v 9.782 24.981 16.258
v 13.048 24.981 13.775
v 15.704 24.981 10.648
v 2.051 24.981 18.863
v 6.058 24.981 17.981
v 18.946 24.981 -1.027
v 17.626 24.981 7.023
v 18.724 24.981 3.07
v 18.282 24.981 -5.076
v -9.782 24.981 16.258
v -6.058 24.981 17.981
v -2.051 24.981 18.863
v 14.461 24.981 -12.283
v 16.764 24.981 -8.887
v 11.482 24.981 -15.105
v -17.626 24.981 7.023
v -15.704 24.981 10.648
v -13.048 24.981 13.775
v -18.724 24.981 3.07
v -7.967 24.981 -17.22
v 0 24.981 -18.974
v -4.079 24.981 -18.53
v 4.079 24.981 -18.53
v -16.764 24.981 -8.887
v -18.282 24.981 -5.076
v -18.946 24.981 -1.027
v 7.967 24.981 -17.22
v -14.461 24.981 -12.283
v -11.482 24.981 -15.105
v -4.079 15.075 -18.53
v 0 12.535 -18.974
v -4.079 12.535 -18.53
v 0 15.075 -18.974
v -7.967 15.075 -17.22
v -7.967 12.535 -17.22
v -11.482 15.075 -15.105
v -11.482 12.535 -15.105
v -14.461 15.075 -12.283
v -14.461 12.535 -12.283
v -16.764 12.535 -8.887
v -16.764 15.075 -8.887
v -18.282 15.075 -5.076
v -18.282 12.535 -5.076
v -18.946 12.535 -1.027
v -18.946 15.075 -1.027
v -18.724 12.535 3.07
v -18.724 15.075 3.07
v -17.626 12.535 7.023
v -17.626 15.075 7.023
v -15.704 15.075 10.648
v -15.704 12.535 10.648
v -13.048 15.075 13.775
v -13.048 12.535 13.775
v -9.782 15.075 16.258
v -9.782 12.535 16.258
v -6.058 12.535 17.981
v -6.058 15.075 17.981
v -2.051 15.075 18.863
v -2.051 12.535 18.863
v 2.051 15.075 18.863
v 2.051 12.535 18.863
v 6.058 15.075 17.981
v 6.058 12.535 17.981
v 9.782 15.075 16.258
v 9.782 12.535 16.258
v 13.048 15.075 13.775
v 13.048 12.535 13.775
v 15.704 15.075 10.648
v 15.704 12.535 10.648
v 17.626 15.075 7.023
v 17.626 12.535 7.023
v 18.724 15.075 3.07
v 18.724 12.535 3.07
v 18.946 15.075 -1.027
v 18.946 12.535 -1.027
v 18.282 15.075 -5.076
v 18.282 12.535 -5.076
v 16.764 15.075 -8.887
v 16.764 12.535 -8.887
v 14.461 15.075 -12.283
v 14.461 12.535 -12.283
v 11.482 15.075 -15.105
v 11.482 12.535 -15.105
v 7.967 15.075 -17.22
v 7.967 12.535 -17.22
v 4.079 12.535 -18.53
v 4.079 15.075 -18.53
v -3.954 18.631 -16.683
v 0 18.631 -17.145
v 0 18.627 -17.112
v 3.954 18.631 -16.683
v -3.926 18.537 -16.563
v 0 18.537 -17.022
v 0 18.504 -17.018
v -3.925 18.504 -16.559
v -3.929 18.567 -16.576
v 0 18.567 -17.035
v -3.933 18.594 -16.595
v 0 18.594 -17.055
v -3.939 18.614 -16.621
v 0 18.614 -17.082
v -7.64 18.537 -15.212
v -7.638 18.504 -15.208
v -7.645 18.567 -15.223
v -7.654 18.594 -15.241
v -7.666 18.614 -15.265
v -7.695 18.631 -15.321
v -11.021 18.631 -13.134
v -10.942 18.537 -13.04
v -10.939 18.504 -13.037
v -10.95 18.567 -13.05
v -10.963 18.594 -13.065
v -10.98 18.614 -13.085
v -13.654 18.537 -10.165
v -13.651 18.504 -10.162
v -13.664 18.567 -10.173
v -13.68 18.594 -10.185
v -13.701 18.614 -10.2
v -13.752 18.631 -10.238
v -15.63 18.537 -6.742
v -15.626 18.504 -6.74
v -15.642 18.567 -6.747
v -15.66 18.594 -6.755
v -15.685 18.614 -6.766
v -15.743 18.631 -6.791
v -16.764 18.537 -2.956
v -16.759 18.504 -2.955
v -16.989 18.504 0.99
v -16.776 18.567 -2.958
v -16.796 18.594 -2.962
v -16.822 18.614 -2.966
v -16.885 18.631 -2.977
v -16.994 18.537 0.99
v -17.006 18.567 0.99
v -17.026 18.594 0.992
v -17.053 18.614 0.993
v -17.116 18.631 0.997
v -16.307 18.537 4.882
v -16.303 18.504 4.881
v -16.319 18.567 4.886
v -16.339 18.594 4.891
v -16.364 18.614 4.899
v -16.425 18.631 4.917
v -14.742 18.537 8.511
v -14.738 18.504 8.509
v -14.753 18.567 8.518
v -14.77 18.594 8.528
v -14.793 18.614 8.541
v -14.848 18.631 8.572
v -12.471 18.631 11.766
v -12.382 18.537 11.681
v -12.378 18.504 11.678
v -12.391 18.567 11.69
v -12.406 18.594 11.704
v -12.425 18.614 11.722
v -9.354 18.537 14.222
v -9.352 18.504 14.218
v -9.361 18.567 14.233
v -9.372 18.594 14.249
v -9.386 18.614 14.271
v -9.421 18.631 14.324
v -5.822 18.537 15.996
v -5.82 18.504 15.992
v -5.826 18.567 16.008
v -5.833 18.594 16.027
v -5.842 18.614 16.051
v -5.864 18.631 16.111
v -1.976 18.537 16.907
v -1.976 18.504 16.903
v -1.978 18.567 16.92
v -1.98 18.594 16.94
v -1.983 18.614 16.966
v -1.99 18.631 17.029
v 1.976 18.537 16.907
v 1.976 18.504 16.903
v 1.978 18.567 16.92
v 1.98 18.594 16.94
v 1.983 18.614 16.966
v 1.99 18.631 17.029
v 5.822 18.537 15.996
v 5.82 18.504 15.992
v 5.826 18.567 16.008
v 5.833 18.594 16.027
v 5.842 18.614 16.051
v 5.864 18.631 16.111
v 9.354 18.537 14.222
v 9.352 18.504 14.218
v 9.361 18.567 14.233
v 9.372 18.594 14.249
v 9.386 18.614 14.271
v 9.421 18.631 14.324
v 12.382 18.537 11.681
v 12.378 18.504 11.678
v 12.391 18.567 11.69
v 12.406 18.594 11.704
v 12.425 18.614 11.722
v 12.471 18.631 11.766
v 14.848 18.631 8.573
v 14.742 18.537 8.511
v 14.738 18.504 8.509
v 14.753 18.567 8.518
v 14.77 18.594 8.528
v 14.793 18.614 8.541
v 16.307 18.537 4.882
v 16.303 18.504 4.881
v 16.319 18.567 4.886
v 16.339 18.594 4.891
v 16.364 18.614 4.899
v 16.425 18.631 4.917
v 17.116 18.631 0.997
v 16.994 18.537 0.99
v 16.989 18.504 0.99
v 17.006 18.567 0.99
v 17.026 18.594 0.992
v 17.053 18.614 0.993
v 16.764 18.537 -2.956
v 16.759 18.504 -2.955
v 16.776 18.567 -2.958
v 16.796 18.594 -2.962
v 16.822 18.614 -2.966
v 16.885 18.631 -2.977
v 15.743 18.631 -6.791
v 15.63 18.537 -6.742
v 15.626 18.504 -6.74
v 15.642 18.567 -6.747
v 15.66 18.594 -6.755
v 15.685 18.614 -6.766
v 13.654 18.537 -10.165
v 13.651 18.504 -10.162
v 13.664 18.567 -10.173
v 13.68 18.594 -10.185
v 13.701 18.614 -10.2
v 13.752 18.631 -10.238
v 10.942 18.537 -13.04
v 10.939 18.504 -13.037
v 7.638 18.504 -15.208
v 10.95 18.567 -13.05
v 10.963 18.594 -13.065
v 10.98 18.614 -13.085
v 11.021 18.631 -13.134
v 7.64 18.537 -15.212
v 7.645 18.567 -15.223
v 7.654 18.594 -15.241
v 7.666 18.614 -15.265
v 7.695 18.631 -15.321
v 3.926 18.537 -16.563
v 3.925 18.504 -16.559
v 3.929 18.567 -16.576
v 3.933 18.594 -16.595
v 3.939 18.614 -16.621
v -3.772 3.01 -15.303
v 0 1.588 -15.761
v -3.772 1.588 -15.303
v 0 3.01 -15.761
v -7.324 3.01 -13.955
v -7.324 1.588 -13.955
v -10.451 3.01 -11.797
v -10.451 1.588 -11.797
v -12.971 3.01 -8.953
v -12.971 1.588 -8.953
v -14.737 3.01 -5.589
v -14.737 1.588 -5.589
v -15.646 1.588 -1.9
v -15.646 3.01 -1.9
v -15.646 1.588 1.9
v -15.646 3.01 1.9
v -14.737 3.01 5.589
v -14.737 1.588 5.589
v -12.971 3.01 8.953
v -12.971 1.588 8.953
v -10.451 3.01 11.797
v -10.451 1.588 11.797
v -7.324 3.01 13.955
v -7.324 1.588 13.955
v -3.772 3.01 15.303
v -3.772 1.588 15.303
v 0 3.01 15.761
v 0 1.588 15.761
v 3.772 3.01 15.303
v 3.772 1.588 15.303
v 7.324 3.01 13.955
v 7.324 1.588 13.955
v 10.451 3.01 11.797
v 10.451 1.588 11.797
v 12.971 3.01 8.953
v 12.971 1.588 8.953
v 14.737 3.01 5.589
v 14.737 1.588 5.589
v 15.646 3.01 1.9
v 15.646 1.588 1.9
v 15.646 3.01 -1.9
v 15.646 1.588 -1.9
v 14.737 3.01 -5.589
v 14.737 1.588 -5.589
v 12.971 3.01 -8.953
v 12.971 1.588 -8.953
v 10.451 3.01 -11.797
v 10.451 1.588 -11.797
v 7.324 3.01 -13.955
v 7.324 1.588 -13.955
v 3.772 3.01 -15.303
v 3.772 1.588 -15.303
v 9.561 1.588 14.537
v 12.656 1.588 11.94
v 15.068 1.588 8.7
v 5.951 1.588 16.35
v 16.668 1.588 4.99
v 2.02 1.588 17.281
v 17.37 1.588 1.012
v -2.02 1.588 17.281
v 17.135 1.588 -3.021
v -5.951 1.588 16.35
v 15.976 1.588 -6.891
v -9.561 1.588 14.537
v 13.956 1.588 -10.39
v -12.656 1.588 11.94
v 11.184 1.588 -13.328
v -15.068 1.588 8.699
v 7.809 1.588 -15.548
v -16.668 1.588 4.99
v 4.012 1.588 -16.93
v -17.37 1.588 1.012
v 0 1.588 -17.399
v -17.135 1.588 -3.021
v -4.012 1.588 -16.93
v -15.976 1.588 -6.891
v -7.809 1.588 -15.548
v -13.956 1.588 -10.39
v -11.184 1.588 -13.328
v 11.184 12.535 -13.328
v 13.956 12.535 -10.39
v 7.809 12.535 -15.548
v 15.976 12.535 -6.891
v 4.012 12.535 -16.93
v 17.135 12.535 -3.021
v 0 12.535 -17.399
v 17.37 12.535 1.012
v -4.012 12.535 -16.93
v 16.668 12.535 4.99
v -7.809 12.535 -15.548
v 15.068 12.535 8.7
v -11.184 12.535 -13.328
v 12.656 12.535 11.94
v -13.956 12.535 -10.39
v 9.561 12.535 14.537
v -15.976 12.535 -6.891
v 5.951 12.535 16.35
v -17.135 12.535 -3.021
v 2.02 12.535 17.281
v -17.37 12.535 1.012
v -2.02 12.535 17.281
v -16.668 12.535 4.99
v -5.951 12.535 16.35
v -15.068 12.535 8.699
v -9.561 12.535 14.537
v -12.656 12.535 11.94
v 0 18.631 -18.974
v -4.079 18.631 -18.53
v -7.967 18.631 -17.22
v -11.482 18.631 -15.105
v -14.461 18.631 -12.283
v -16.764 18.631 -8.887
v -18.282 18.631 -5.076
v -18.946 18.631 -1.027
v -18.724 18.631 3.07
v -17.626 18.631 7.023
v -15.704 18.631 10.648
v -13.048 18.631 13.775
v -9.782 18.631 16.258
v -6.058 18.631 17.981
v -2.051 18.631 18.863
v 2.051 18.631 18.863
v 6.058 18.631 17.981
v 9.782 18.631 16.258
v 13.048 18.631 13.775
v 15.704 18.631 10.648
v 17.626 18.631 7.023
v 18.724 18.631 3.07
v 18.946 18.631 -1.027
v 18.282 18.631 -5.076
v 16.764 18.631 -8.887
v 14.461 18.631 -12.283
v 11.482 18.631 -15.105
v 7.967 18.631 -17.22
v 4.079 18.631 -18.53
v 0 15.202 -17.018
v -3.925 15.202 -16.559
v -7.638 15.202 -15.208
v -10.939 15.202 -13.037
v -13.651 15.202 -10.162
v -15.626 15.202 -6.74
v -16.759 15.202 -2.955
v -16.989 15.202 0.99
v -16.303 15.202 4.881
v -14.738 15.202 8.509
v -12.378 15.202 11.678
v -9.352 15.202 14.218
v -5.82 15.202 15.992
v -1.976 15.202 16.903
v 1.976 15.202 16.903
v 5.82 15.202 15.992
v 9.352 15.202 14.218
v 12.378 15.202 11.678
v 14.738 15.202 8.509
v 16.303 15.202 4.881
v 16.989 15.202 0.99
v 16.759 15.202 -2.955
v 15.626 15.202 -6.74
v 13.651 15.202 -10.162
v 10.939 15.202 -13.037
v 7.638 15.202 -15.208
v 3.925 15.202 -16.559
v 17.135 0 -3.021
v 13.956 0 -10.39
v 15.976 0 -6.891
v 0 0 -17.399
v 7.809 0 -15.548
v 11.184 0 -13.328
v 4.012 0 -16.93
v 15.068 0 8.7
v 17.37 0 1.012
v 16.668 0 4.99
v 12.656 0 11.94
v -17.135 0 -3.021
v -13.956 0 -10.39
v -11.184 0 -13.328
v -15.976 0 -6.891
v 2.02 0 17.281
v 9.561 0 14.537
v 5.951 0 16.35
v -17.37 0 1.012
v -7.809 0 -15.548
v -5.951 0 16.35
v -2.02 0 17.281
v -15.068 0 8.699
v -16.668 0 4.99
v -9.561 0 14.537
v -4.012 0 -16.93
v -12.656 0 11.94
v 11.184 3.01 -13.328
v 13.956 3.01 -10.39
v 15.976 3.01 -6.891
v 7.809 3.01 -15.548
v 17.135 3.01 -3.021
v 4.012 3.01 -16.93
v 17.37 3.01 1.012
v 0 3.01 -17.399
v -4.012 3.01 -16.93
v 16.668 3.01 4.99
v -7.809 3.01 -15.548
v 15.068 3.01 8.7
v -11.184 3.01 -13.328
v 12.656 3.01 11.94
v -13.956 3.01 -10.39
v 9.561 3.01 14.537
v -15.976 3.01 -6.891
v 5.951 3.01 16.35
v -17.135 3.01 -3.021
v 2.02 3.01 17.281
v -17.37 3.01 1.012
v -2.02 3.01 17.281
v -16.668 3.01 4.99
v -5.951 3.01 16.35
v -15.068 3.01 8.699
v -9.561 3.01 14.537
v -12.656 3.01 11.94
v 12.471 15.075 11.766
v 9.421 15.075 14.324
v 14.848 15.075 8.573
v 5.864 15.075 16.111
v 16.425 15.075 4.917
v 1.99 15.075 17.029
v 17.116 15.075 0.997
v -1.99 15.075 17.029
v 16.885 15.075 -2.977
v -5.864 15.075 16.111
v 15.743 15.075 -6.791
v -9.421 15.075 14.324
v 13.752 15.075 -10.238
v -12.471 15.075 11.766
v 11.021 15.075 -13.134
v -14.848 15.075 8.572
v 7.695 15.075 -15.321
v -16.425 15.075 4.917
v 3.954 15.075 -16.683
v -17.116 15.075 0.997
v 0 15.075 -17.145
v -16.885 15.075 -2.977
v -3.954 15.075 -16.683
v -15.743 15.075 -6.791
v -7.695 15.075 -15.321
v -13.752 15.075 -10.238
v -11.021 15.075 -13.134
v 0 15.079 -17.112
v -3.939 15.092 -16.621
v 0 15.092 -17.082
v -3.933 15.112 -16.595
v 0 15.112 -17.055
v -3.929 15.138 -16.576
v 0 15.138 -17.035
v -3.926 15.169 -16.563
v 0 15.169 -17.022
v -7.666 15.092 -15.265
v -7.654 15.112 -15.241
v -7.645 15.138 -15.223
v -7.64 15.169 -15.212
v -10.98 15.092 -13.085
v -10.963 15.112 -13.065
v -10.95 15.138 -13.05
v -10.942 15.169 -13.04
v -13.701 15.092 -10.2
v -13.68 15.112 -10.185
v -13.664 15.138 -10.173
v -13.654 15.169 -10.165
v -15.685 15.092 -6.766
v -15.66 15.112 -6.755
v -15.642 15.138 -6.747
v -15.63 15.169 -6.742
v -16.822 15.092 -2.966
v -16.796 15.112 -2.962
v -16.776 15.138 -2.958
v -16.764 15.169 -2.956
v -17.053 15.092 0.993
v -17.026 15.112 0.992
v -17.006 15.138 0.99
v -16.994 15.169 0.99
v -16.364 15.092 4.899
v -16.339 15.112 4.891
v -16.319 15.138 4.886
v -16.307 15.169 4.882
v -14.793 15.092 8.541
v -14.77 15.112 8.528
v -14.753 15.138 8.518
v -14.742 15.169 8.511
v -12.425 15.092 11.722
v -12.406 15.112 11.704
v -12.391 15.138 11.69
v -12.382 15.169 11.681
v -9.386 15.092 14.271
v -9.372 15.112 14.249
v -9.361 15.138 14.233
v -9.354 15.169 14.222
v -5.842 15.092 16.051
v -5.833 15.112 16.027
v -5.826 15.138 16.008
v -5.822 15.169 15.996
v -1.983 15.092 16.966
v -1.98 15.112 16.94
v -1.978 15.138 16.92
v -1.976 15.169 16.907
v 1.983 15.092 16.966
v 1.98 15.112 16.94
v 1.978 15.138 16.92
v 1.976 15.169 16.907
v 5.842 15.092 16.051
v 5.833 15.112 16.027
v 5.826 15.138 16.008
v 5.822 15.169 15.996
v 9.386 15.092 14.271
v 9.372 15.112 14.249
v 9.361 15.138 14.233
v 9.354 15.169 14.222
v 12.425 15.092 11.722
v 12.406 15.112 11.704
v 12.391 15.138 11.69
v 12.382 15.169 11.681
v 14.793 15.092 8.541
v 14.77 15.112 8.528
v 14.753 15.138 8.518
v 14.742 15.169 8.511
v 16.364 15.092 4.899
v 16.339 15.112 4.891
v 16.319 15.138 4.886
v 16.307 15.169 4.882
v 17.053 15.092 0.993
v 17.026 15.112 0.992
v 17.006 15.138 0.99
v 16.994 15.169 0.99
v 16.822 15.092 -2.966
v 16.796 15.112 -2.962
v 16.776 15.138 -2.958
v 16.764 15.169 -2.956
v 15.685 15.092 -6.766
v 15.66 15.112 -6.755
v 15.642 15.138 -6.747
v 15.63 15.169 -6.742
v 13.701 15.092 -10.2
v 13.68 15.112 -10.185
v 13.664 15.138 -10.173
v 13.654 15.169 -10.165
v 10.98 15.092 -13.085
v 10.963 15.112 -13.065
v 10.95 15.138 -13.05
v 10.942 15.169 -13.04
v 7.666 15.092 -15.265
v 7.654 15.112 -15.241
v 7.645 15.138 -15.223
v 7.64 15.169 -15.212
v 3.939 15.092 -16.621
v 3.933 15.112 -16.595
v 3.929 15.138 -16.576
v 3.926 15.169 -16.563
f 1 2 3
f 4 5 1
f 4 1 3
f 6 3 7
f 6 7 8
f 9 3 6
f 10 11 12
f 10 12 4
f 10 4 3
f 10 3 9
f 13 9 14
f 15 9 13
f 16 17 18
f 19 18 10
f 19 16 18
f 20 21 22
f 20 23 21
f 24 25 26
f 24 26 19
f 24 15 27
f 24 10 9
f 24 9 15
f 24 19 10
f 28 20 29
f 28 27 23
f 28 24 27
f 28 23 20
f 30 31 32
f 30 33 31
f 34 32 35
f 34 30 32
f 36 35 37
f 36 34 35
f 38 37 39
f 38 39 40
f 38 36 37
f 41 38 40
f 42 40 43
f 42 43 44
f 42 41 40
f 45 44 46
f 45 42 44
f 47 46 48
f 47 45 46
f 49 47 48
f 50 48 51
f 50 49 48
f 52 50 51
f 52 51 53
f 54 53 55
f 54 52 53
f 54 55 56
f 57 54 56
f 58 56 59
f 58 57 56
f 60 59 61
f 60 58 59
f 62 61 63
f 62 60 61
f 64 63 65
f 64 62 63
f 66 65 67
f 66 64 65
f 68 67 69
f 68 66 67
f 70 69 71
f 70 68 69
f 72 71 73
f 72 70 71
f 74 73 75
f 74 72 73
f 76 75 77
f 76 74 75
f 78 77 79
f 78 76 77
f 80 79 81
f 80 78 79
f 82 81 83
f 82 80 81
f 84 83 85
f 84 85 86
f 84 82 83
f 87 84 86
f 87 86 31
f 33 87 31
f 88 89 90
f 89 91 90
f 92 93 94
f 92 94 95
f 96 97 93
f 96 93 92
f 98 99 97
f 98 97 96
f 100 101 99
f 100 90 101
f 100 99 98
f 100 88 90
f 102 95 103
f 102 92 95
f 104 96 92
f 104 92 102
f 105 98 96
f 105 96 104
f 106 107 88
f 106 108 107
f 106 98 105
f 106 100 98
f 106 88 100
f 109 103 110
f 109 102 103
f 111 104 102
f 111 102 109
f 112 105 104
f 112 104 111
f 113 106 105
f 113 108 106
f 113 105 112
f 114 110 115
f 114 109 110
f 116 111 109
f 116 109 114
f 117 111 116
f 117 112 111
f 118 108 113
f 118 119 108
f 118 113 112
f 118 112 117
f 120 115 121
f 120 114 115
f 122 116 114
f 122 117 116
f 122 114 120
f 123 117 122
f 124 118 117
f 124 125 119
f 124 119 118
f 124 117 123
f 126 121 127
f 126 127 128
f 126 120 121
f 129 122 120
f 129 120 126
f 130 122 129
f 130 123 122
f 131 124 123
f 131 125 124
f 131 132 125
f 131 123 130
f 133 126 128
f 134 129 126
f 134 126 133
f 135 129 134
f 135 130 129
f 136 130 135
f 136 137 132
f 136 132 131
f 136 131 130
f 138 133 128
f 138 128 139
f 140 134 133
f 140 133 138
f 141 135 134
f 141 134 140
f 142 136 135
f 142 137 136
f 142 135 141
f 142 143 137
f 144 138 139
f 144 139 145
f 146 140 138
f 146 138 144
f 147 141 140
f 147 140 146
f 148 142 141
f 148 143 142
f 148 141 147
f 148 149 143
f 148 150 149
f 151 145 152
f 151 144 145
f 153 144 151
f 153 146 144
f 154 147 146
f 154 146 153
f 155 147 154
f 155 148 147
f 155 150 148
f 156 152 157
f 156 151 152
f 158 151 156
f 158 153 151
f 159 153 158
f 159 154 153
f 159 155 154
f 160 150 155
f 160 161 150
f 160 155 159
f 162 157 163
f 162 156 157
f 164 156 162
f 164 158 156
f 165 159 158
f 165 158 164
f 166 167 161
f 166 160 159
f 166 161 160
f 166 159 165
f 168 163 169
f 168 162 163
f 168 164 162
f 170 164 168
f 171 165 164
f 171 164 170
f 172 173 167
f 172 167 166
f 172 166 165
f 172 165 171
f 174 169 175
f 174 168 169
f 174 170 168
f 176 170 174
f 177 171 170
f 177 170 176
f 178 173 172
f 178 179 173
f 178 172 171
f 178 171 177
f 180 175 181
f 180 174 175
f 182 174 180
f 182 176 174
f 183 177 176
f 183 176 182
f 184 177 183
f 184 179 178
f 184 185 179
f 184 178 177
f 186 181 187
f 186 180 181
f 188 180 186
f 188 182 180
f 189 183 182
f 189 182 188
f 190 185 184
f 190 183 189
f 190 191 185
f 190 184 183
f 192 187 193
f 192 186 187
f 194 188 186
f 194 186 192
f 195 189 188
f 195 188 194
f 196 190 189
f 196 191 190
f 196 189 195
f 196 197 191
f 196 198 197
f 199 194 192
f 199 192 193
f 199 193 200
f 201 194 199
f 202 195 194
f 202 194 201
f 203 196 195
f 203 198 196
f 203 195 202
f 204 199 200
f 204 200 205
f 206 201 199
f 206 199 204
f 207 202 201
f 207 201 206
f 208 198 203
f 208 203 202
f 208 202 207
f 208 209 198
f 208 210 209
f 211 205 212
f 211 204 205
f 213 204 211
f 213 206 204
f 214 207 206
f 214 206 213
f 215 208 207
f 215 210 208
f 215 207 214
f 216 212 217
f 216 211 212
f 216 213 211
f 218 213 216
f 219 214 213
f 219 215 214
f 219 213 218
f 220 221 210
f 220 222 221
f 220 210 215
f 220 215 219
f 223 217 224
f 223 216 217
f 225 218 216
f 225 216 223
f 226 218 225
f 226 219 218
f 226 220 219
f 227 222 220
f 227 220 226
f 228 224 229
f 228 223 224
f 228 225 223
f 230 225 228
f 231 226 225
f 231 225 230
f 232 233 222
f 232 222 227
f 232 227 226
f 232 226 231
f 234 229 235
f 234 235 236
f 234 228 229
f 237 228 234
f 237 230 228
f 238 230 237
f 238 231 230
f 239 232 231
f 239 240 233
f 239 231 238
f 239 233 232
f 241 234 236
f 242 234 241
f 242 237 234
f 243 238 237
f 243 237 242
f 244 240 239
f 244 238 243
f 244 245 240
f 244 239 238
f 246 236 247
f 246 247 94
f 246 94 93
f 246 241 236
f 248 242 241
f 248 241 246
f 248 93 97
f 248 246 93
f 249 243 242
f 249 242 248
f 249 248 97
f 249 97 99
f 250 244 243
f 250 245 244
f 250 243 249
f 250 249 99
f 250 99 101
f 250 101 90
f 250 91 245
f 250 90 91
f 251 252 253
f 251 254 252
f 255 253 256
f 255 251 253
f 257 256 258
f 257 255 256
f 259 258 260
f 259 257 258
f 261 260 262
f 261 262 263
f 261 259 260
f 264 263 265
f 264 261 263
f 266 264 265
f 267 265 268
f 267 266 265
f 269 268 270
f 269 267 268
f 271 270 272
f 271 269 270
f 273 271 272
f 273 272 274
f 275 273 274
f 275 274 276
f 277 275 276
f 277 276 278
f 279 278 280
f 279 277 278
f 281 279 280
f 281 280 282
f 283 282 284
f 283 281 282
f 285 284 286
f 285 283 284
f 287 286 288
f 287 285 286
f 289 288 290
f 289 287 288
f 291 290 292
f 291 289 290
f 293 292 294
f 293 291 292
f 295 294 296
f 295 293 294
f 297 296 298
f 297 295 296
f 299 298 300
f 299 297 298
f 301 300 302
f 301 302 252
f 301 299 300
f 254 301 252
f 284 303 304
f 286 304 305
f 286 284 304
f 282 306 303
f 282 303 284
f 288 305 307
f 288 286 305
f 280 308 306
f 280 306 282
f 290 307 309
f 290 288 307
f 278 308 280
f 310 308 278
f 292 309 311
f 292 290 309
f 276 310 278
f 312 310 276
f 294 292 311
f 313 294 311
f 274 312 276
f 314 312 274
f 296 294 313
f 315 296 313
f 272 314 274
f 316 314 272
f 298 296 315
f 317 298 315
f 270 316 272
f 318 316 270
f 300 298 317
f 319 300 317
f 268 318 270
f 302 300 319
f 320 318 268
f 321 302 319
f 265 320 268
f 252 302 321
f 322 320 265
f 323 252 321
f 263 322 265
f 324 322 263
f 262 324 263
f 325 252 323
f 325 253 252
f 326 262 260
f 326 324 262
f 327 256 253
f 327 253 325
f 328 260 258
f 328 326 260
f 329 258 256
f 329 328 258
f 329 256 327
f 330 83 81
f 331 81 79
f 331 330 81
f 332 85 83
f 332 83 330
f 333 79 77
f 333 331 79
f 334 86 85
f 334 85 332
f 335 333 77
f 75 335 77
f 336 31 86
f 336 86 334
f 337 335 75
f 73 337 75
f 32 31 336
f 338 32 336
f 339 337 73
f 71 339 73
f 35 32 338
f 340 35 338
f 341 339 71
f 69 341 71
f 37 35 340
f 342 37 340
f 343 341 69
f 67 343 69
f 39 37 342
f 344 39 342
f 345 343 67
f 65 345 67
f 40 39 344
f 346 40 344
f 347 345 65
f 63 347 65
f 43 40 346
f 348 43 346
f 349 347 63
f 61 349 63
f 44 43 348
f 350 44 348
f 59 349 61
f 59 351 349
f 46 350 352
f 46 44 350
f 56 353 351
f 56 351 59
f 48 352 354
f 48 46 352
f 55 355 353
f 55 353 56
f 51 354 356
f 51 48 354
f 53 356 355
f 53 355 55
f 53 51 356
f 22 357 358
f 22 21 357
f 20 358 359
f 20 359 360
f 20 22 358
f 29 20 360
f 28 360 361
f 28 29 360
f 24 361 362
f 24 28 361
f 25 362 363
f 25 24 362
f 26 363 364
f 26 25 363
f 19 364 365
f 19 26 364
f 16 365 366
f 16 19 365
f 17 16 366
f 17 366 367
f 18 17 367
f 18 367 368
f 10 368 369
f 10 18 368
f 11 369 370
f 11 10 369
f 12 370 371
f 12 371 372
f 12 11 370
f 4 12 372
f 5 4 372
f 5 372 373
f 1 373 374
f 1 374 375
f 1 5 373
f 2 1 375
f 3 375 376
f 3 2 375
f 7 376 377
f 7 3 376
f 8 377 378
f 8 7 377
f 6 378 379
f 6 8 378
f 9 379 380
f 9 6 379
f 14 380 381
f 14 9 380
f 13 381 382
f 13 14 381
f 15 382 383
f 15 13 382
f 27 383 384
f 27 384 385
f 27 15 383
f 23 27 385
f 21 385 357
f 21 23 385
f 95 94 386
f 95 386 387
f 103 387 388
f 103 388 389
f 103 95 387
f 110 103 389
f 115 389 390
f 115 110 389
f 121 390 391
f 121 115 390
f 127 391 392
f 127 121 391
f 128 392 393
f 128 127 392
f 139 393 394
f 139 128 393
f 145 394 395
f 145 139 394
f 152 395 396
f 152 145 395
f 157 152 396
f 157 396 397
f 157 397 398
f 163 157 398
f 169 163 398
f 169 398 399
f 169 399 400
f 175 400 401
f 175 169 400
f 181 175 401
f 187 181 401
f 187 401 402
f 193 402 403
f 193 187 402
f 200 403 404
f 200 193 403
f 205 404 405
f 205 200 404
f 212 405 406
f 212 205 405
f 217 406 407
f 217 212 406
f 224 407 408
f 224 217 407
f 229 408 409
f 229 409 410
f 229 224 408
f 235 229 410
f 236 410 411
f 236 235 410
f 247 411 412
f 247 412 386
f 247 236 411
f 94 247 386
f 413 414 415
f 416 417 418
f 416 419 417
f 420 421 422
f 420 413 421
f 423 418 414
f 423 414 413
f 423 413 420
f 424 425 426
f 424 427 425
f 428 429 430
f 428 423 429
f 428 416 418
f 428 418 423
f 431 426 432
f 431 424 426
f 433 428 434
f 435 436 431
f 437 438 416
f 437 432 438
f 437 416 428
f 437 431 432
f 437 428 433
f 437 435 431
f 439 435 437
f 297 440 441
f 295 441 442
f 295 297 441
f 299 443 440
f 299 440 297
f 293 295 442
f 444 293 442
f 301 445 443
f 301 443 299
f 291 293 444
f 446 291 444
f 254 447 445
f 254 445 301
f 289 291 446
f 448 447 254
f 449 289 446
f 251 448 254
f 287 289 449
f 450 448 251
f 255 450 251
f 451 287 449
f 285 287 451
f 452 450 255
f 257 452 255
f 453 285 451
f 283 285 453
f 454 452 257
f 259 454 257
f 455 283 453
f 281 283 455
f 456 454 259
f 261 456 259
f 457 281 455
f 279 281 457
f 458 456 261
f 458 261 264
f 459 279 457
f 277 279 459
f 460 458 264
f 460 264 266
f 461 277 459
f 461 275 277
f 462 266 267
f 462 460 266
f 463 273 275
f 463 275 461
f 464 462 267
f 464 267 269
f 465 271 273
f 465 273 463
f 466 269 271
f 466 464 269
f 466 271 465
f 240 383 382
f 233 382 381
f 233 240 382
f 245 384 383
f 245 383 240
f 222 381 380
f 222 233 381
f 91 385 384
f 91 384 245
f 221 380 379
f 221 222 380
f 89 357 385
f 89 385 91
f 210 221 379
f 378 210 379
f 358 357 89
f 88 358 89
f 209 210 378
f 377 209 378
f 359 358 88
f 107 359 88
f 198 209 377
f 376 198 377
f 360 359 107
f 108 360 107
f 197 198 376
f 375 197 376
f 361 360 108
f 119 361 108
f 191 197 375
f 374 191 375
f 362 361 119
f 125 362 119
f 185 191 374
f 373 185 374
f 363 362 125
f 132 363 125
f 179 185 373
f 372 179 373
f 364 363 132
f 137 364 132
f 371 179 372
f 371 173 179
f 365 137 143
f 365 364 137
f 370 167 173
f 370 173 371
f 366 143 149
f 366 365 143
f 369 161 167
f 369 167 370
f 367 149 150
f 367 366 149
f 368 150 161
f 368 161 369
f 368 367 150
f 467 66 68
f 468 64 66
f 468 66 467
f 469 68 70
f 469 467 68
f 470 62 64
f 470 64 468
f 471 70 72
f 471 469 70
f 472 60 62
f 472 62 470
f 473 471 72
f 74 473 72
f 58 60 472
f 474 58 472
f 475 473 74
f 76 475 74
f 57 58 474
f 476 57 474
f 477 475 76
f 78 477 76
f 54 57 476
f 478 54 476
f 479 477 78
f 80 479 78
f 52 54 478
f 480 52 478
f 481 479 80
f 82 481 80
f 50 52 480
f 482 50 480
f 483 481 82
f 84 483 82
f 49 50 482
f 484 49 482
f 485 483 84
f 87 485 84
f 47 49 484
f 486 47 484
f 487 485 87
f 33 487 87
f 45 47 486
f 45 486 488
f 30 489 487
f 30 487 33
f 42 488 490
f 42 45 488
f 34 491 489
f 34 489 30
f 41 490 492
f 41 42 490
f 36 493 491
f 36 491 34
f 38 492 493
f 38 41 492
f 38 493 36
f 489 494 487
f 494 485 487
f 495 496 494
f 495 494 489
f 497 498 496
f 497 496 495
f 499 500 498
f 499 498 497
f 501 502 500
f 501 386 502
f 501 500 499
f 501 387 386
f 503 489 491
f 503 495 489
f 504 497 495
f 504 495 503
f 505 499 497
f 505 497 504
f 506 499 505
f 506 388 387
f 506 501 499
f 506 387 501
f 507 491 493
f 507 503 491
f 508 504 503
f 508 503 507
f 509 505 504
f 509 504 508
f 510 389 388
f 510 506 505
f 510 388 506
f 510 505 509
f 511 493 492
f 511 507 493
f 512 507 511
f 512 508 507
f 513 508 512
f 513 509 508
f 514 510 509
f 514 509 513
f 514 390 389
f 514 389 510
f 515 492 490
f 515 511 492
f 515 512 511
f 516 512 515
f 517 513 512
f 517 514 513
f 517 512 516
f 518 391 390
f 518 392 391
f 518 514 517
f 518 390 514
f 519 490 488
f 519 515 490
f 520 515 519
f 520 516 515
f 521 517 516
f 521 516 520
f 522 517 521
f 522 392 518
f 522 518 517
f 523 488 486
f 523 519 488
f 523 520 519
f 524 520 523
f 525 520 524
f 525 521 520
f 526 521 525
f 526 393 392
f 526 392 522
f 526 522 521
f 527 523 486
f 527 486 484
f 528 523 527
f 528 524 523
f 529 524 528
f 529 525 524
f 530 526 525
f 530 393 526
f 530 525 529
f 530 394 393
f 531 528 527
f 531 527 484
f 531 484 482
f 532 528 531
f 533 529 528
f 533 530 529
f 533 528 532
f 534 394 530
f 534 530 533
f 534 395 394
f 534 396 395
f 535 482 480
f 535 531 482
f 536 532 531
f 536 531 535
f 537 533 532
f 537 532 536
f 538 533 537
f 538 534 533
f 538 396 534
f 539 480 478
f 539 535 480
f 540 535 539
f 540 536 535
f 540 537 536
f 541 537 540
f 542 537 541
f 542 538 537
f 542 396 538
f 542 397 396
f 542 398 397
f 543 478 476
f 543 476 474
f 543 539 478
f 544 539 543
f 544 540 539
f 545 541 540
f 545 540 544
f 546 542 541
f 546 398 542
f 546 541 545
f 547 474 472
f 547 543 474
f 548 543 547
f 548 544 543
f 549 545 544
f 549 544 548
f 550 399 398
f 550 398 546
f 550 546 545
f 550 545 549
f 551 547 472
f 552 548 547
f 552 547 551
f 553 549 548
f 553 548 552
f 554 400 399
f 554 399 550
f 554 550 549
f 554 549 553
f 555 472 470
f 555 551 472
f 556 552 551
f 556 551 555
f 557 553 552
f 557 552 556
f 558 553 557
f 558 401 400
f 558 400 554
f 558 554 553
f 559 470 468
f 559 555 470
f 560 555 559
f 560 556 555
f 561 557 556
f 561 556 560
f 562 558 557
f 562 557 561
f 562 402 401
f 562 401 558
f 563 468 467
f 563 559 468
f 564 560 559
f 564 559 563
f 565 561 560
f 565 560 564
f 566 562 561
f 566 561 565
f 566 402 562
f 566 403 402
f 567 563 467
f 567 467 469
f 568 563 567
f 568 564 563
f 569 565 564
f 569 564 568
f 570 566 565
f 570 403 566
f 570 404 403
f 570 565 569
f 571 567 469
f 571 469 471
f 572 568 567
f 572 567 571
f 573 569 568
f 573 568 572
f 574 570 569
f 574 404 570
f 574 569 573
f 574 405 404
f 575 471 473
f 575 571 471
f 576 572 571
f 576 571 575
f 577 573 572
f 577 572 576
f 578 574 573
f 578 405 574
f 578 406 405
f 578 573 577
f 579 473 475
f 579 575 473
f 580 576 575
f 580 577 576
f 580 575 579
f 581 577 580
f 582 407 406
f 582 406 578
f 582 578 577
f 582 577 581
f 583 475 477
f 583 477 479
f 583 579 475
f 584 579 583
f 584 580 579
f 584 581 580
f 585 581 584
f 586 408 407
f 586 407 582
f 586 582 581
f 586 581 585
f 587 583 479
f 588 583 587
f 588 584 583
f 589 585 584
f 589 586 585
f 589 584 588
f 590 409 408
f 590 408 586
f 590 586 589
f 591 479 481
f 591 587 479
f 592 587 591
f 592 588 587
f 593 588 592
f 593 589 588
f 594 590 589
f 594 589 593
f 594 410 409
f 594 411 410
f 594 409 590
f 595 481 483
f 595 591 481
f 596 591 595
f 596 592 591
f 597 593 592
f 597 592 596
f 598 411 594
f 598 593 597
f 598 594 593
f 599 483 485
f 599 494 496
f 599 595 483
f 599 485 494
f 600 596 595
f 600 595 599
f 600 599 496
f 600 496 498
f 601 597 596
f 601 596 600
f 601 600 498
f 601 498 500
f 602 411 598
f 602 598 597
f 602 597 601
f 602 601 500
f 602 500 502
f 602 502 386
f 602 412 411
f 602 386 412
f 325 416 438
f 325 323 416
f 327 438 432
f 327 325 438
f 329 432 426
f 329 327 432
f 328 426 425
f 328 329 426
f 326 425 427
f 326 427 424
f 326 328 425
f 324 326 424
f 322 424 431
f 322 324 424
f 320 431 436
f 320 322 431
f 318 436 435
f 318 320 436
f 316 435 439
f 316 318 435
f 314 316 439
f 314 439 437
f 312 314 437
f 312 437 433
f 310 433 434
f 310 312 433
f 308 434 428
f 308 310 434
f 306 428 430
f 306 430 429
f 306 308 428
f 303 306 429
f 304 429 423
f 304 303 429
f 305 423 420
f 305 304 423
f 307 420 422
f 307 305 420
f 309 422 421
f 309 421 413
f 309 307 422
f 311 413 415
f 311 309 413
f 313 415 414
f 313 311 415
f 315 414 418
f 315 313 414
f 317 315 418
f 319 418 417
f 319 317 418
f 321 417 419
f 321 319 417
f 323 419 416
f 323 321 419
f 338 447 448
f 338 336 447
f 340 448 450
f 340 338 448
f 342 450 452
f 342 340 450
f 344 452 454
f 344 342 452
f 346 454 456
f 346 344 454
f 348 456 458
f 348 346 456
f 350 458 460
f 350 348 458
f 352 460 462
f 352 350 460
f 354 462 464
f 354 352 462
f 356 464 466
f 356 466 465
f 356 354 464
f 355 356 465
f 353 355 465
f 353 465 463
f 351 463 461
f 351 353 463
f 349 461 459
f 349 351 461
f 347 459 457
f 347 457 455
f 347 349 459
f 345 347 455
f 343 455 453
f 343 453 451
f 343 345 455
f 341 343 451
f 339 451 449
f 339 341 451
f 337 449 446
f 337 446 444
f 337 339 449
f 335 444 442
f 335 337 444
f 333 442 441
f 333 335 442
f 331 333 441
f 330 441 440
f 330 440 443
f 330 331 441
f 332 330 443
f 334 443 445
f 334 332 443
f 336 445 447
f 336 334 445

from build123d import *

# Parameters (mm, degrees)
FILLET4_R = 0.127


with BuildPart() as part:
    # Sketch1 → Revolve1 (revolve)
    with BuildSketch(Plane.XY):
        Polygon((0, 0), (-17.399, 0), (-17.399, 1.5875), (-15.7607, 1.5875), (-15.7607, 3.0099), (-17.399, 3.0099), (-17.399, 12.5349), (-18.9738, 12.5349), (-18.9738, 15.0749), (-17.018, 15.0749), (-17.018, 18.6309), (-18.9738, 18.6309), (-18.9738, 24.9809), (0, 24.9809), align=None)
    revolve(axis=Axis((0, 0, 0), (0, 1, 0)))

    # Fillet4
    fillet4_edges = [part.edges().sort_by_distance(p)[0] for p in [
        (17.018, 15.0749, 0),
        (17.018, 18.6309, 0),
    ]]
    fillet(fillet4_edges, radius=FILLET4_R)


solid = part.part
